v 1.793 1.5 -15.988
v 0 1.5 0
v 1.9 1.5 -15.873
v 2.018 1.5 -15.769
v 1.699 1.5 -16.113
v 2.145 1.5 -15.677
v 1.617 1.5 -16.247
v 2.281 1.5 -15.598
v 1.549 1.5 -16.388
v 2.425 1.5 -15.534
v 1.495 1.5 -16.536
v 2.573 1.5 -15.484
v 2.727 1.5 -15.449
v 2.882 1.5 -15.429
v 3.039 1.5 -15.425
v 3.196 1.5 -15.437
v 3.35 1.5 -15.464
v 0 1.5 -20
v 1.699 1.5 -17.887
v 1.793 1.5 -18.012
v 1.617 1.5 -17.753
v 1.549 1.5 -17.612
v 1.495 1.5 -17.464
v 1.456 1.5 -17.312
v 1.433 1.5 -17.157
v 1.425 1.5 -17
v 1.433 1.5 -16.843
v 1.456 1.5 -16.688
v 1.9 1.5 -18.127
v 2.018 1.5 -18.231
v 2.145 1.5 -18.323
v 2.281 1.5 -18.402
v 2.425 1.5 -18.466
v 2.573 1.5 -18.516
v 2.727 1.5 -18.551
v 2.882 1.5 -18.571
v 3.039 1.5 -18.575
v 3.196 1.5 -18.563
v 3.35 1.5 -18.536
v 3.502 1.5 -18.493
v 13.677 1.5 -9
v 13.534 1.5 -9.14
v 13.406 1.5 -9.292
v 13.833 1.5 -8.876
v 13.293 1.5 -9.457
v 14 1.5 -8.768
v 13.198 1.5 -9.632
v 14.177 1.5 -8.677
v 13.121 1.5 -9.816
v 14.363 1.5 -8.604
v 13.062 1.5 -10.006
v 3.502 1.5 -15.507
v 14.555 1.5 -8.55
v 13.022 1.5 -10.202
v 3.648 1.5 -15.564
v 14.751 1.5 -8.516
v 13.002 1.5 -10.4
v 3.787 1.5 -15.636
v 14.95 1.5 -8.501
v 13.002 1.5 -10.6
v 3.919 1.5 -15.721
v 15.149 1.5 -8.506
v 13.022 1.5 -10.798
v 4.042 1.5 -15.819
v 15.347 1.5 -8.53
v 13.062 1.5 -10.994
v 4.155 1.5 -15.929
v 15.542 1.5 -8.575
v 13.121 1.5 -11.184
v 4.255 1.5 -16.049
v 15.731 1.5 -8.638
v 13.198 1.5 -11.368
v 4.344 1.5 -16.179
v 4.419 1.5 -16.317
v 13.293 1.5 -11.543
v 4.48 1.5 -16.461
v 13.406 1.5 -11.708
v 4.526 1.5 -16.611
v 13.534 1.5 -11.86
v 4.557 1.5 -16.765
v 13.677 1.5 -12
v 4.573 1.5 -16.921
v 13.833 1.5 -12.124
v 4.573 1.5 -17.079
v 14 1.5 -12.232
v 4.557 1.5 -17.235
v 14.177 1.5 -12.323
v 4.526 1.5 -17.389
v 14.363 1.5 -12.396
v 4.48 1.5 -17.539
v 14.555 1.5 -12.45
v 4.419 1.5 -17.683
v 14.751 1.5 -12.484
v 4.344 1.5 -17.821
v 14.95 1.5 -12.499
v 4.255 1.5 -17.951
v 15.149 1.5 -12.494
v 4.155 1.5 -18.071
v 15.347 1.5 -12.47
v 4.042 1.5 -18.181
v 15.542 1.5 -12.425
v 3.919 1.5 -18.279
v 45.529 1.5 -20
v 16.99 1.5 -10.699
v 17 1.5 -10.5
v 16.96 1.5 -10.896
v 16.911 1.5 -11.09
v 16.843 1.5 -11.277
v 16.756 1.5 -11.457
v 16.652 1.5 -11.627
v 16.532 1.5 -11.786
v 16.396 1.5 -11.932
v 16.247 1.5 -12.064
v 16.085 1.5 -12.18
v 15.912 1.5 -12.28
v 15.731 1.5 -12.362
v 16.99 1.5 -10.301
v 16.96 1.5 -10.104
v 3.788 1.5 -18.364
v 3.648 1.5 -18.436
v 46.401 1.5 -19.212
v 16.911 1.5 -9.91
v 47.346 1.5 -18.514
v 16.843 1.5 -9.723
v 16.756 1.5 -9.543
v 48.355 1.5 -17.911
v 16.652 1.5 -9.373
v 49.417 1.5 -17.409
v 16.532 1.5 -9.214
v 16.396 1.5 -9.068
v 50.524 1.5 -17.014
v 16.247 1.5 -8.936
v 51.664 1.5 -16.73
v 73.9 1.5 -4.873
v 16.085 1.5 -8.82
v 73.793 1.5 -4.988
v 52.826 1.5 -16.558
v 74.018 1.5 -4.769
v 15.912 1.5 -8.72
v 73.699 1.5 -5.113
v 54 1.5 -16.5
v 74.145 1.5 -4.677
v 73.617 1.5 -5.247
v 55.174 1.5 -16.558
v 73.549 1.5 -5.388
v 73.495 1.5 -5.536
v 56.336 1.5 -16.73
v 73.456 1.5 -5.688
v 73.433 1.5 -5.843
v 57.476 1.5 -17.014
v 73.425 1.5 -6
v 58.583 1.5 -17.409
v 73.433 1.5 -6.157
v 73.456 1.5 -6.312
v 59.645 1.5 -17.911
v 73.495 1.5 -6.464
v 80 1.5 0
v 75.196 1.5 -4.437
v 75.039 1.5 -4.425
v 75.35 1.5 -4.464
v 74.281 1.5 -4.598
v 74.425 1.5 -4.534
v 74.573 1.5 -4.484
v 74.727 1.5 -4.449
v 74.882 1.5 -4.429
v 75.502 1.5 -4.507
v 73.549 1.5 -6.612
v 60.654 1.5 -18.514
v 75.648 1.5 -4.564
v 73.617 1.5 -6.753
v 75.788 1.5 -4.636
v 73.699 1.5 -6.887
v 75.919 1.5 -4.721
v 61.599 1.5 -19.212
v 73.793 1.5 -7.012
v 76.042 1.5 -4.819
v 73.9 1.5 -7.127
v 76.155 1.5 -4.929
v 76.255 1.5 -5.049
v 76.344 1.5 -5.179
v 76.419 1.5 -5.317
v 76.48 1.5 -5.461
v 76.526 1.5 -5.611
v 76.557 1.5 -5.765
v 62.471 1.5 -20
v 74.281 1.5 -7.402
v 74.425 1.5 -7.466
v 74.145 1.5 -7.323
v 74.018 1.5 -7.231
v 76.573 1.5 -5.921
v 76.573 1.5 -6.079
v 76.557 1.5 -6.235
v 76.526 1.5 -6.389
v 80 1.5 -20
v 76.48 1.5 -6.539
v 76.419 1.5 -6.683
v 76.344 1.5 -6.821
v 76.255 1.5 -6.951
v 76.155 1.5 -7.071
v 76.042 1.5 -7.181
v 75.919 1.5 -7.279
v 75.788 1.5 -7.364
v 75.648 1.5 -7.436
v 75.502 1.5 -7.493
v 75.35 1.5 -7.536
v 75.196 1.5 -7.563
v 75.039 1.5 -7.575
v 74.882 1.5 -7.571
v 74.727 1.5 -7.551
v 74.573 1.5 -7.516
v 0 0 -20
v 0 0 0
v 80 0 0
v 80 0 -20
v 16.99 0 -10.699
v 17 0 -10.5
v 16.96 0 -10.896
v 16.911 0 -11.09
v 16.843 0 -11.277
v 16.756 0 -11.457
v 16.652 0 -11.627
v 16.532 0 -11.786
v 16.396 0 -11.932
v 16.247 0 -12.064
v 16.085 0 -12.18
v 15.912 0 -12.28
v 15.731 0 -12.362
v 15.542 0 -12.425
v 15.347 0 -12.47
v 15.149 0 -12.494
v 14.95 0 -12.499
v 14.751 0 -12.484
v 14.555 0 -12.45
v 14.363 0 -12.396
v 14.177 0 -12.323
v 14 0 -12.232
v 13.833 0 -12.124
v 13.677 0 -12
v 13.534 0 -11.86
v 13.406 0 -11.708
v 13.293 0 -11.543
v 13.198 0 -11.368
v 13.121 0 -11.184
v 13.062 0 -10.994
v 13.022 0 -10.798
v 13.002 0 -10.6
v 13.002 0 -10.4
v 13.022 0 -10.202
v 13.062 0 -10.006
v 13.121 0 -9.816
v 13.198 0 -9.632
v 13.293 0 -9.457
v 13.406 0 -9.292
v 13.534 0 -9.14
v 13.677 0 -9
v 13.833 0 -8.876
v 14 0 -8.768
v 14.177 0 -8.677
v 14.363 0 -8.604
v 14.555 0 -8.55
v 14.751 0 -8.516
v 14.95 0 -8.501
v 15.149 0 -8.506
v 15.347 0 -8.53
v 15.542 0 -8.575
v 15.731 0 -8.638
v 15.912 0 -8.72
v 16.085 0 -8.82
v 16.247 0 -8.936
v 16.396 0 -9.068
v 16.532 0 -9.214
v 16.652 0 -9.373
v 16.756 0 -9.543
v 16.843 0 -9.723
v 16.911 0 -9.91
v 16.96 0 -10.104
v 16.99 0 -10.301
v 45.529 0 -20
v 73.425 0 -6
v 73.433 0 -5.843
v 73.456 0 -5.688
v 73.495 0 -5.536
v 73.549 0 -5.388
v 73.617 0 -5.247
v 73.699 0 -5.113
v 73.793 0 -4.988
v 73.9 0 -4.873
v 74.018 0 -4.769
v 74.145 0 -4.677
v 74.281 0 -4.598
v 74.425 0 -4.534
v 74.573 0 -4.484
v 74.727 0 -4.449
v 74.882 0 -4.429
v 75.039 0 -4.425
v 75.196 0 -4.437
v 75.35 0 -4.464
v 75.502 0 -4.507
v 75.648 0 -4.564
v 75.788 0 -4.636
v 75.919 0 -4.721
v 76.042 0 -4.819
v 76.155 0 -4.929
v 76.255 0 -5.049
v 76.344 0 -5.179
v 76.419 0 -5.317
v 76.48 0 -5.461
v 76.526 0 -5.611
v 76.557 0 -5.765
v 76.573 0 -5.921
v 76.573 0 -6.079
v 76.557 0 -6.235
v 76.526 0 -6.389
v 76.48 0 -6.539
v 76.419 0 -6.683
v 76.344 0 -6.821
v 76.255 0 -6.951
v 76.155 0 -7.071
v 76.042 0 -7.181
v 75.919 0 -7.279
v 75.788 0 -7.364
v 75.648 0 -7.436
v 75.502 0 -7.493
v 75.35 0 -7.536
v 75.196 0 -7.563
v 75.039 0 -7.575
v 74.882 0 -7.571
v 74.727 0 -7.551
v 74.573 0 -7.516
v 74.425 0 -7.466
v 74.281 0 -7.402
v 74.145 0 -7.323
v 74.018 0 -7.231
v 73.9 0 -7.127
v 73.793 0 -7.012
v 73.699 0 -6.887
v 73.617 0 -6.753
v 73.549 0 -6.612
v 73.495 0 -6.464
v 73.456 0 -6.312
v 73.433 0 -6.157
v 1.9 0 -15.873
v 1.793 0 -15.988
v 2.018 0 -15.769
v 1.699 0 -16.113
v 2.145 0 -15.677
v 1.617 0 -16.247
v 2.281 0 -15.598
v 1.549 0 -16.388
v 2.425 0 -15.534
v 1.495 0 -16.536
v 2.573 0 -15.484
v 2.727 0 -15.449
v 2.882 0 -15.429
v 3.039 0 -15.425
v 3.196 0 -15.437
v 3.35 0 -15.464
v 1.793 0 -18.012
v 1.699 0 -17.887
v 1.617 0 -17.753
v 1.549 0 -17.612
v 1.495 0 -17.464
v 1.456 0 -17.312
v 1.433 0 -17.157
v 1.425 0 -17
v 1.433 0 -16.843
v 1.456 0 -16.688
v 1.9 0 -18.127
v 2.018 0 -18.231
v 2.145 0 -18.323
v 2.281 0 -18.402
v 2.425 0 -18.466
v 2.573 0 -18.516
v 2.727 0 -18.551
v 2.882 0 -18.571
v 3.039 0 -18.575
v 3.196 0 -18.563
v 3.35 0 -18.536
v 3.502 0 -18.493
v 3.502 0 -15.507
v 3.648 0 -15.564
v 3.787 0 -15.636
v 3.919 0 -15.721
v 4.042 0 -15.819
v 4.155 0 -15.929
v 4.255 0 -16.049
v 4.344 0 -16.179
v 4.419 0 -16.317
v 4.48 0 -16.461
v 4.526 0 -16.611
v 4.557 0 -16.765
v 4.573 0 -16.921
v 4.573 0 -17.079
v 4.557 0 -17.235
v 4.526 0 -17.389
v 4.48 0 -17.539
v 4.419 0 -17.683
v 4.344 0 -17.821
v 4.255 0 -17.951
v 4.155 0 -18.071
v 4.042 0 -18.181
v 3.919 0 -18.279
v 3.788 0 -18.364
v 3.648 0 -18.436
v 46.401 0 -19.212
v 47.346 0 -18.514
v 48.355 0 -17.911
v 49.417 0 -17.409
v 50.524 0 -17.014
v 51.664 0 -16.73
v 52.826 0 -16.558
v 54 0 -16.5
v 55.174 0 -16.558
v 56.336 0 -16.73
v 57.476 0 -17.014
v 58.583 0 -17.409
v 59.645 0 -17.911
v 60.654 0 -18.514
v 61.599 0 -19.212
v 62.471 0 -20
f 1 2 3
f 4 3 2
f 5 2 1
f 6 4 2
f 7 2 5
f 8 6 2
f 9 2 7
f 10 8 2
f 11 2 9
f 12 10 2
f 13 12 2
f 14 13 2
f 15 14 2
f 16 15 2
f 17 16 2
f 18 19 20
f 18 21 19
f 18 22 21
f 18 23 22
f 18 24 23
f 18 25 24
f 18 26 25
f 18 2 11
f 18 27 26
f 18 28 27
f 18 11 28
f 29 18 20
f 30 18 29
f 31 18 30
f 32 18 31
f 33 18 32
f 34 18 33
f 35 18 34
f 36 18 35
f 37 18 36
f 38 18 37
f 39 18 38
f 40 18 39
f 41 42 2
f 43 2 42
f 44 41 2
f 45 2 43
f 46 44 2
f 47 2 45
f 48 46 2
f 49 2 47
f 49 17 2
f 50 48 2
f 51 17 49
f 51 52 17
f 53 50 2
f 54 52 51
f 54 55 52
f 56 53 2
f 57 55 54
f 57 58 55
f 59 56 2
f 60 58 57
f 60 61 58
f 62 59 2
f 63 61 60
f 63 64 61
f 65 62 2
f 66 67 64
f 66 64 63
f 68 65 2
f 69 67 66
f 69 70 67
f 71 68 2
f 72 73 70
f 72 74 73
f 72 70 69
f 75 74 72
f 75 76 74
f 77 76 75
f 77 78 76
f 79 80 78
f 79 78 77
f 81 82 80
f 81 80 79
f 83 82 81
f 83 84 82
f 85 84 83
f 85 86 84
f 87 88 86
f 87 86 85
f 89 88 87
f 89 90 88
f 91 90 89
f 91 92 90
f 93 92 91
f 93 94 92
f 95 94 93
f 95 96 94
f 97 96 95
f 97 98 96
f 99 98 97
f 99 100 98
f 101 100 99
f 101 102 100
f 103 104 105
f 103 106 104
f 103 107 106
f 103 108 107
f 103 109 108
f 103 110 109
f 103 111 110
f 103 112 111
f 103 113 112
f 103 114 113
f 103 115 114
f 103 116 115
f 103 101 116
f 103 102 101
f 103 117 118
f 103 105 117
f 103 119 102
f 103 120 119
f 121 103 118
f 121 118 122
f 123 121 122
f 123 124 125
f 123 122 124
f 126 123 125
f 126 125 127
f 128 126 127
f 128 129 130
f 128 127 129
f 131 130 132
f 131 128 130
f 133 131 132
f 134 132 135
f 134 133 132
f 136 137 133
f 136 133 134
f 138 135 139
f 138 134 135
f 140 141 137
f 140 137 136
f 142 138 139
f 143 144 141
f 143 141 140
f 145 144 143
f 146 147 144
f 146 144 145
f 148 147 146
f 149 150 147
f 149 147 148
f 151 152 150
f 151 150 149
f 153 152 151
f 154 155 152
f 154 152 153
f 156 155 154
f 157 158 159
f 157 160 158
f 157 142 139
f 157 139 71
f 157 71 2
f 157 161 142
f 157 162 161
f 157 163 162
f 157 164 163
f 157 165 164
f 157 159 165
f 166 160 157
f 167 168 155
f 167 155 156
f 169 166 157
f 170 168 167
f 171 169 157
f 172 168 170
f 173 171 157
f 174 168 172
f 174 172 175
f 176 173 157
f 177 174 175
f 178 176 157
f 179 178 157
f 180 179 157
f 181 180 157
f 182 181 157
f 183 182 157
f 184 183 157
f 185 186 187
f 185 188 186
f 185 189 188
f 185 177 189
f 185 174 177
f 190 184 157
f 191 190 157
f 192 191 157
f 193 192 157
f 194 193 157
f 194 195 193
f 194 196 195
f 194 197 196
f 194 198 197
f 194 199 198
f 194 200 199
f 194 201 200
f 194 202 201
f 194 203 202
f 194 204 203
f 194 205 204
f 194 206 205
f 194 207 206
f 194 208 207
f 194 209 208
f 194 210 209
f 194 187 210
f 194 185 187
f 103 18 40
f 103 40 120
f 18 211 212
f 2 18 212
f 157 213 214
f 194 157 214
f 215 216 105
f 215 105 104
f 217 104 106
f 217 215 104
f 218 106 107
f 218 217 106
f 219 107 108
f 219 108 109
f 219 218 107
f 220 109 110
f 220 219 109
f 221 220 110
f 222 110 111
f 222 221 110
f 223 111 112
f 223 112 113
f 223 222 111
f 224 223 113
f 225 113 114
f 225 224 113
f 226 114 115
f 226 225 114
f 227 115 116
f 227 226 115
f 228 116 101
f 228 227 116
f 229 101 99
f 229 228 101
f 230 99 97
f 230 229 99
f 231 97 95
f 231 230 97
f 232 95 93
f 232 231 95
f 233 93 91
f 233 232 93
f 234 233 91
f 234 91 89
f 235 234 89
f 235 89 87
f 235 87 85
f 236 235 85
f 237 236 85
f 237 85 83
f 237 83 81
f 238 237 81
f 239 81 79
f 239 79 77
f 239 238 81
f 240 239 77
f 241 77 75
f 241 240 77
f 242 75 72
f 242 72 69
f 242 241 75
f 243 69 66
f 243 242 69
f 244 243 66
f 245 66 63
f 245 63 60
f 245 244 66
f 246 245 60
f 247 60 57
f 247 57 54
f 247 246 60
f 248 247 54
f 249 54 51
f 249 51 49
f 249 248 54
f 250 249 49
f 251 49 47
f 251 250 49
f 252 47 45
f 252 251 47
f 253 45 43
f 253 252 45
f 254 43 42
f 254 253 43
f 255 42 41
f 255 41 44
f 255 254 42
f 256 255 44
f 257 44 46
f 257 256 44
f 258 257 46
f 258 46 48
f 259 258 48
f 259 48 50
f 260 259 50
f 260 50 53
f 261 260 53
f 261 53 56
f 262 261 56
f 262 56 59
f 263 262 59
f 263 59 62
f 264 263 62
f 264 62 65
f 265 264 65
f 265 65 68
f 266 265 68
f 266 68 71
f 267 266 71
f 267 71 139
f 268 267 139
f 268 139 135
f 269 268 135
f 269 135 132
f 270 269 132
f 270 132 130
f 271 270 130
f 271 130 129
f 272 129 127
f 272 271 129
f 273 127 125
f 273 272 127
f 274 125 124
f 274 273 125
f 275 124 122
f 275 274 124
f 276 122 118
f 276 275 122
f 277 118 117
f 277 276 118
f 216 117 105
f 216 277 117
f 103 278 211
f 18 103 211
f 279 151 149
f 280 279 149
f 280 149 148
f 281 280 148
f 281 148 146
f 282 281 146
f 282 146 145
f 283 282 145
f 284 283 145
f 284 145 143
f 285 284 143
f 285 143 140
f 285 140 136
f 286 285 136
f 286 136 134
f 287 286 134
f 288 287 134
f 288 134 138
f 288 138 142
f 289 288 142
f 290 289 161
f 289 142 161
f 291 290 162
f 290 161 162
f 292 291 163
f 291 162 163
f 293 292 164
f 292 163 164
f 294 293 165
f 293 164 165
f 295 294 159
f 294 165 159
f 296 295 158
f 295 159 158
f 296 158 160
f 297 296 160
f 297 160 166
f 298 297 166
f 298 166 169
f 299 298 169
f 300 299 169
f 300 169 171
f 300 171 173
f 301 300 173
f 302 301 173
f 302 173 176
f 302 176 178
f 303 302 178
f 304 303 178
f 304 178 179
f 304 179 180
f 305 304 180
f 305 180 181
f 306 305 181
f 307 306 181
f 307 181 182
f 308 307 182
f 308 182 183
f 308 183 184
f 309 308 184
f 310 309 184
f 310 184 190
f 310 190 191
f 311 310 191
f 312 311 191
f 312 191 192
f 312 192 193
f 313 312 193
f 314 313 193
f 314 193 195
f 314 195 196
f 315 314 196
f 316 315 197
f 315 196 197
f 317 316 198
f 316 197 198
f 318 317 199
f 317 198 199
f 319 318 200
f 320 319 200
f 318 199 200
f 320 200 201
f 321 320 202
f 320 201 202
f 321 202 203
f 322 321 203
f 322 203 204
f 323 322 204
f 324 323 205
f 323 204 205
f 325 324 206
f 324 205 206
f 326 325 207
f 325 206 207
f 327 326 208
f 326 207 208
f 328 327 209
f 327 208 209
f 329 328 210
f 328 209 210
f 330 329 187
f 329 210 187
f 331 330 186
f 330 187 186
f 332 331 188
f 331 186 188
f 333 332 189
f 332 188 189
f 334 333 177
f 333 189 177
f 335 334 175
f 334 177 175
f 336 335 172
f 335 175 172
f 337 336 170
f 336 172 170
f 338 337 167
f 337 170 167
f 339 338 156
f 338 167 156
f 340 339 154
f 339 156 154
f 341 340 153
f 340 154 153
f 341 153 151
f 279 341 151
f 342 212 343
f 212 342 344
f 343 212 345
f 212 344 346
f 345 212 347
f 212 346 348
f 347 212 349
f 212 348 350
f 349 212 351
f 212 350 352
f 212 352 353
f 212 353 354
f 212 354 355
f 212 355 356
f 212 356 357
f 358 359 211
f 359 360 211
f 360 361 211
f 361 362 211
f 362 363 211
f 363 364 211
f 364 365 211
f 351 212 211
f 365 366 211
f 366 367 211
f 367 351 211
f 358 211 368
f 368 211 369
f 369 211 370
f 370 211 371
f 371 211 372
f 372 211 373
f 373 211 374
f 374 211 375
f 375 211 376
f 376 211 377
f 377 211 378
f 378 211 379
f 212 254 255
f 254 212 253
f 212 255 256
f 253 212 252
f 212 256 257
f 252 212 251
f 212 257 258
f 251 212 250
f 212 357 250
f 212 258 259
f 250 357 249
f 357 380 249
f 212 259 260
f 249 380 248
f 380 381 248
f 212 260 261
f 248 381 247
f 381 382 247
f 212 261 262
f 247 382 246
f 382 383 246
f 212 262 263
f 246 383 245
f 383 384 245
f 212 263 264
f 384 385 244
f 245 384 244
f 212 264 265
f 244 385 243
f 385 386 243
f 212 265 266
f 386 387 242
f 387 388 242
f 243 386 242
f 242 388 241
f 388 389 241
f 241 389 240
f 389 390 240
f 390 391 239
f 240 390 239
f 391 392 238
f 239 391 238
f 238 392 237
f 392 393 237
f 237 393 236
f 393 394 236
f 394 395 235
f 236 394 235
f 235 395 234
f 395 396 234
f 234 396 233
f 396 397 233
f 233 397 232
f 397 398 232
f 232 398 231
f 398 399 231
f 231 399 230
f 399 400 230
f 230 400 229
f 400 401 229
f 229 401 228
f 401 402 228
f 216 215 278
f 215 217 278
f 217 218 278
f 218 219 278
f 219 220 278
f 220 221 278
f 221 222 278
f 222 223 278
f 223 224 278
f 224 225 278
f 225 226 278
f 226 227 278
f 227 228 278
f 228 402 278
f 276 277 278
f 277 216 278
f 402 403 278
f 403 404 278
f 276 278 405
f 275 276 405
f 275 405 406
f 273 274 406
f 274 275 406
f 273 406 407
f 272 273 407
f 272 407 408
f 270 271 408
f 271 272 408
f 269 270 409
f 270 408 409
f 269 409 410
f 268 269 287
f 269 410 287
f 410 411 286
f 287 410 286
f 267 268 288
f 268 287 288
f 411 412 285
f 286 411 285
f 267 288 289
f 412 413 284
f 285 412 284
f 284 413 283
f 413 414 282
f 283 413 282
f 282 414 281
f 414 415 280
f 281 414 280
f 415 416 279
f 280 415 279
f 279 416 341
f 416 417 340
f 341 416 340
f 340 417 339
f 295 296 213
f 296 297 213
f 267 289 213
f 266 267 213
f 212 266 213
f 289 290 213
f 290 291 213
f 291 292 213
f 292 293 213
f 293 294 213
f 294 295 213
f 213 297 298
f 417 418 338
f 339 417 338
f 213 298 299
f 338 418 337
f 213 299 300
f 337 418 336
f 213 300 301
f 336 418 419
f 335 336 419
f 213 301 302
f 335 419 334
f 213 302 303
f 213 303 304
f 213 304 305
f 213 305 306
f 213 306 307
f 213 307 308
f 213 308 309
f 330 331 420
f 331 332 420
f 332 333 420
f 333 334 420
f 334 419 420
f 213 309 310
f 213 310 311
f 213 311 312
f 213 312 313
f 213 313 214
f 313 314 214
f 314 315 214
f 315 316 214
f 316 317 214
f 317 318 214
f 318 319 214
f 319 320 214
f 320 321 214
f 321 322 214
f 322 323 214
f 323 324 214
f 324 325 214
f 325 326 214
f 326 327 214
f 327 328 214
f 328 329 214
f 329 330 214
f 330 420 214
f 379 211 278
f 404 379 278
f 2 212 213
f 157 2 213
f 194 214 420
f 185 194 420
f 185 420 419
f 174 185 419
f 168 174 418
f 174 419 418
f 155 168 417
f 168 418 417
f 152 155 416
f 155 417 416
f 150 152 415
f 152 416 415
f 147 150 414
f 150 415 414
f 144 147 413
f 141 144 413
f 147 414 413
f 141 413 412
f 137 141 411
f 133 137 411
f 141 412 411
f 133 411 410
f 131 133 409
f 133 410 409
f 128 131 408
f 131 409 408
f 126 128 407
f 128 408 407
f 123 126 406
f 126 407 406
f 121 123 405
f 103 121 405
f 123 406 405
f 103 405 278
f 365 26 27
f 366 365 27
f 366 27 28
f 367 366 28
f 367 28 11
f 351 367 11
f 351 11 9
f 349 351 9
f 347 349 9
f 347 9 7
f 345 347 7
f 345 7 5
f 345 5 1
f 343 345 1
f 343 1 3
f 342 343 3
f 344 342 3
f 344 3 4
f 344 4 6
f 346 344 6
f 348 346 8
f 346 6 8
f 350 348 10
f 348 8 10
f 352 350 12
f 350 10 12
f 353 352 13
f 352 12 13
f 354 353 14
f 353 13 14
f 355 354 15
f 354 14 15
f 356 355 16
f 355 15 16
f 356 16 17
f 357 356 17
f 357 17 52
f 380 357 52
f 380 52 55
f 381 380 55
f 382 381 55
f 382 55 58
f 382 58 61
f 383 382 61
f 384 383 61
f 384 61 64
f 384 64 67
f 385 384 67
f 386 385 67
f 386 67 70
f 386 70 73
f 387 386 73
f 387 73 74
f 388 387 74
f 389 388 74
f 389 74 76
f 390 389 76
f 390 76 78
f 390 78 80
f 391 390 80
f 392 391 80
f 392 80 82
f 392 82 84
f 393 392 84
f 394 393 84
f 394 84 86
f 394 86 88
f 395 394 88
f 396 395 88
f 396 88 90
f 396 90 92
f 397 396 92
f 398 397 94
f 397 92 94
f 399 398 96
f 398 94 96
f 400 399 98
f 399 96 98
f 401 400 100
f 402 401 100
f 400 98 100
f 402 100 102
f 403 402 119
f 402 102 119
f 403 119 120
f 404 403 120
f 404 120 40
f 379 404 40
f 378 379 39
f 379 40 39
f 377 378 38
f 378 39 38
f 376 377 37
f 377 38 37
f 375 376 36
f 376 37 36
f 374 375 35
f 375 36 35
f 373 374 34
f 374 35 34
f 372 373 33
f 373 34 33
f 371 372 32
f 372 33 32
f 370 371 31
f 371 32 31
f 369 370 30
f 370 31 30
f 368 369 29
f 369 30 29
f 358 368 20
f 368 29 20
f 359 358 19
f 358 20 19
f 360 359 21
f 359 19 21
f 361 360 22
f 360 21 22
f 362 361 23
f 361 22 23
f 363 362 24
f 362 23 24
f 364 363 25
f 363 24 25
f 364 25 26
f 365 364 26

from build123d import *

# Parameters (mm, degrees)
SKETCH_1_R          = 2
EXTRUDE_1_DEPTH     = 1.5
HOLE_WIZARD_3_D     = 3.15
HOLE_WIZARD_3_DEPTH = 12
HOLE_WIZARD_3_TIP   = 0.946355475


with BuildPart() as part:
    # Эскиз1 → Бобышка-Вытянуть1 (new body)
    with BuildSketch(Plane(origin=(0, 0, 0), x_dir=(1, 0, 0), z_dir=(0, 1, 0))):
        with BuildLine():
            Line((0, 0), (80, 0))
            Line((80, 0), (80, 20))
            Line((80, 20), (62.470537173, 20))
            ThreePointArc((62.470537173, 20), (54, 16.5), (45.529462827, 20))
            Line((45.529462827, 20), (0, 20))
            Line((0, 20), (0, 0))
        make_face()
        with Locations((15, 10.5)):
            Circle(SKETCH_1_R, mode=Mode.SUBTRACT)
    extrude(amount=EXTRUDE_1_DEPTH)

    # Под_М3
    with Locations(Plane.XZ):
        with Locations((75, -6), (3, -17)):
            Hole(HOLE_WIZARD_3_D / 2, depth=HOLE_WIZARD_3_DEPTH)
            with Locations((0, 0, -(HOLE_WIZARD_3_DEPTH + HOLE_WIZARD_3_TIP / 2))):  # 118° drill point
                Cone(0, HOLE_WIZARD_3_D / 2, HOLE_WIZARD_3_TIP, mode=Mode.SUBTRACT)


solid = part.part
